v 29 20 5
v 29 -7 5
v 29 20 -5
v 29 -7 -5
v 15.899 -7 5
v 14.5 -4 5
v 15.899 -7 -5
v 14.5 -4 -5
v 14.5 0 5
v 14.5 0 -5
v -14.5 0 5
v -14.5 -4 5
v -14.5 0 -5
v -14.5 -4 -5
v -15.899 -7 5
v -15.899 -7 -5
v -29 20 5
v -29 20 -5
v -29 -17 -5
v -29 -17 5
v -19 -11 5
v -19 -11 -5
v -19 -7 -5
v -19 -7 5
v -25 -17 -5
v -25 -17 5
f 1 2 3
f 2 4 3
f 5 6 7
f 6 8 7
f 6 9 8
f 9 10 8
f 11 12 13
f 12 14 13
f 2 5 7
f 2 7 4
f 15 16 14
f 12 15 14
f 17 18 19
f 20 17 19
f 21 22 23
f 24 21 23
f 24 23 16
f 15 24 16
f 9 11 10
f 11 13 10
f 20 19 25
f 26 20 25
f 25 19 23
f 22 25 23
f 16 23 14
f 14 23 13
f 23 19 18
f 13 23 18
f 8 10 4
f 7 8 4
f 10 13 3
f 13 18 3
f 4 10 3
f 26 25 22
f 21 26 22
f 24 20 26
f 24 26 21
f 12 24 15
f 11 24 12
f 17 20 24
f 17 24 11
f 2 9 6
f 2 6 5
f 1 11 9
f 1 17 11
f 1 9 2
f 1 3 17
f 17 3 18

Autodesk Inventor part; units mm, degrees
ref_plane "YZ Plane" through (0, 0, 0) normal (1, 0, 0) x (0, 1, 0)
ref_plane "XZ Plane" through (0, 0, 0) normal (0, 1, 0) x (-1, 0, 0)
ref_plane "XY Plane" through (0, 0, 0) normal (0, 0, 1) x (1, 0, 0)
sketch "Skizze1" plane through (0, 0, 0) normal (0, 0, 1) x (1, 0, 0)
  line L0 (-19, -11) -> (-19, -7)
  line L1 (-19, -7) -> (-15.8989, -7)
  line L2 (-15.8989, -7) -> (-14.5, -4)
  line L3 (-14.5, -4) -> (-14.5, 0)
  line L4 (-14.5, 0) -> (14.5, 0)
  line L5 (14.5, 0) -> (14.5, -4)
  line L6 (14.5, -4) -> (15.8989, -7)
  line L7 (15.8989, -7) -> (19, -7)
  line L8 (19, -7) -> (19, -11)
  line L9 (19, -11) -> (25, -17)
  line L10 (25, -17) -> (29, -17)
  line L11 (29, -17) -> (29, 20)
  line L12 (29, 20) -> (-29, 20)
  line L13 (-29, 20) -> (-29, -17)
  line L14 (-29, -17) -> (-25, -17)
  line L15 (-25, -17) -> (-19, -11)
  line L16 (0, 0) -> (0, -29.3821)
  dimension "d5" = 29
  dimension "d6" = 20
  dimension "d7" = 4
  dimension "d8" = 4.5
  dimension "d10" = 38
  dimension "d12" = 25
  dimension "d13" = 10
  dimension "d14" = 10
  dimension "d15" = 7
  dimension "d16" = 45
  dimension "d17" = 10
  dimension "d18" = 4
extrude "Extrusion1" add sketch "Skizze1" along normal mid plane 10
sketch "Skizze2" plane through (25, -17, 5) normal (0, -1, 0) x (1, 0, 0)
  line L0 (4, -10) -> (4, 0) projected
  line L1 (-54, -10) -> (4, -10) projected
  line L2 (4, 0) -> (-6, 0)
  line L3 (-6, 0) -> (-6, -10)
  line L4 (-6, -10) -> (4, -10)
  line L5 (4, -10) -> (4, 0)
  point P0 (-25, -5)
  dimension "d21" = 10
extrude "Extrusion2" cut sketch "Skizze2" against normal blind 10
properties part number "_WT_Aufnahme_Antriebseinheit3"
